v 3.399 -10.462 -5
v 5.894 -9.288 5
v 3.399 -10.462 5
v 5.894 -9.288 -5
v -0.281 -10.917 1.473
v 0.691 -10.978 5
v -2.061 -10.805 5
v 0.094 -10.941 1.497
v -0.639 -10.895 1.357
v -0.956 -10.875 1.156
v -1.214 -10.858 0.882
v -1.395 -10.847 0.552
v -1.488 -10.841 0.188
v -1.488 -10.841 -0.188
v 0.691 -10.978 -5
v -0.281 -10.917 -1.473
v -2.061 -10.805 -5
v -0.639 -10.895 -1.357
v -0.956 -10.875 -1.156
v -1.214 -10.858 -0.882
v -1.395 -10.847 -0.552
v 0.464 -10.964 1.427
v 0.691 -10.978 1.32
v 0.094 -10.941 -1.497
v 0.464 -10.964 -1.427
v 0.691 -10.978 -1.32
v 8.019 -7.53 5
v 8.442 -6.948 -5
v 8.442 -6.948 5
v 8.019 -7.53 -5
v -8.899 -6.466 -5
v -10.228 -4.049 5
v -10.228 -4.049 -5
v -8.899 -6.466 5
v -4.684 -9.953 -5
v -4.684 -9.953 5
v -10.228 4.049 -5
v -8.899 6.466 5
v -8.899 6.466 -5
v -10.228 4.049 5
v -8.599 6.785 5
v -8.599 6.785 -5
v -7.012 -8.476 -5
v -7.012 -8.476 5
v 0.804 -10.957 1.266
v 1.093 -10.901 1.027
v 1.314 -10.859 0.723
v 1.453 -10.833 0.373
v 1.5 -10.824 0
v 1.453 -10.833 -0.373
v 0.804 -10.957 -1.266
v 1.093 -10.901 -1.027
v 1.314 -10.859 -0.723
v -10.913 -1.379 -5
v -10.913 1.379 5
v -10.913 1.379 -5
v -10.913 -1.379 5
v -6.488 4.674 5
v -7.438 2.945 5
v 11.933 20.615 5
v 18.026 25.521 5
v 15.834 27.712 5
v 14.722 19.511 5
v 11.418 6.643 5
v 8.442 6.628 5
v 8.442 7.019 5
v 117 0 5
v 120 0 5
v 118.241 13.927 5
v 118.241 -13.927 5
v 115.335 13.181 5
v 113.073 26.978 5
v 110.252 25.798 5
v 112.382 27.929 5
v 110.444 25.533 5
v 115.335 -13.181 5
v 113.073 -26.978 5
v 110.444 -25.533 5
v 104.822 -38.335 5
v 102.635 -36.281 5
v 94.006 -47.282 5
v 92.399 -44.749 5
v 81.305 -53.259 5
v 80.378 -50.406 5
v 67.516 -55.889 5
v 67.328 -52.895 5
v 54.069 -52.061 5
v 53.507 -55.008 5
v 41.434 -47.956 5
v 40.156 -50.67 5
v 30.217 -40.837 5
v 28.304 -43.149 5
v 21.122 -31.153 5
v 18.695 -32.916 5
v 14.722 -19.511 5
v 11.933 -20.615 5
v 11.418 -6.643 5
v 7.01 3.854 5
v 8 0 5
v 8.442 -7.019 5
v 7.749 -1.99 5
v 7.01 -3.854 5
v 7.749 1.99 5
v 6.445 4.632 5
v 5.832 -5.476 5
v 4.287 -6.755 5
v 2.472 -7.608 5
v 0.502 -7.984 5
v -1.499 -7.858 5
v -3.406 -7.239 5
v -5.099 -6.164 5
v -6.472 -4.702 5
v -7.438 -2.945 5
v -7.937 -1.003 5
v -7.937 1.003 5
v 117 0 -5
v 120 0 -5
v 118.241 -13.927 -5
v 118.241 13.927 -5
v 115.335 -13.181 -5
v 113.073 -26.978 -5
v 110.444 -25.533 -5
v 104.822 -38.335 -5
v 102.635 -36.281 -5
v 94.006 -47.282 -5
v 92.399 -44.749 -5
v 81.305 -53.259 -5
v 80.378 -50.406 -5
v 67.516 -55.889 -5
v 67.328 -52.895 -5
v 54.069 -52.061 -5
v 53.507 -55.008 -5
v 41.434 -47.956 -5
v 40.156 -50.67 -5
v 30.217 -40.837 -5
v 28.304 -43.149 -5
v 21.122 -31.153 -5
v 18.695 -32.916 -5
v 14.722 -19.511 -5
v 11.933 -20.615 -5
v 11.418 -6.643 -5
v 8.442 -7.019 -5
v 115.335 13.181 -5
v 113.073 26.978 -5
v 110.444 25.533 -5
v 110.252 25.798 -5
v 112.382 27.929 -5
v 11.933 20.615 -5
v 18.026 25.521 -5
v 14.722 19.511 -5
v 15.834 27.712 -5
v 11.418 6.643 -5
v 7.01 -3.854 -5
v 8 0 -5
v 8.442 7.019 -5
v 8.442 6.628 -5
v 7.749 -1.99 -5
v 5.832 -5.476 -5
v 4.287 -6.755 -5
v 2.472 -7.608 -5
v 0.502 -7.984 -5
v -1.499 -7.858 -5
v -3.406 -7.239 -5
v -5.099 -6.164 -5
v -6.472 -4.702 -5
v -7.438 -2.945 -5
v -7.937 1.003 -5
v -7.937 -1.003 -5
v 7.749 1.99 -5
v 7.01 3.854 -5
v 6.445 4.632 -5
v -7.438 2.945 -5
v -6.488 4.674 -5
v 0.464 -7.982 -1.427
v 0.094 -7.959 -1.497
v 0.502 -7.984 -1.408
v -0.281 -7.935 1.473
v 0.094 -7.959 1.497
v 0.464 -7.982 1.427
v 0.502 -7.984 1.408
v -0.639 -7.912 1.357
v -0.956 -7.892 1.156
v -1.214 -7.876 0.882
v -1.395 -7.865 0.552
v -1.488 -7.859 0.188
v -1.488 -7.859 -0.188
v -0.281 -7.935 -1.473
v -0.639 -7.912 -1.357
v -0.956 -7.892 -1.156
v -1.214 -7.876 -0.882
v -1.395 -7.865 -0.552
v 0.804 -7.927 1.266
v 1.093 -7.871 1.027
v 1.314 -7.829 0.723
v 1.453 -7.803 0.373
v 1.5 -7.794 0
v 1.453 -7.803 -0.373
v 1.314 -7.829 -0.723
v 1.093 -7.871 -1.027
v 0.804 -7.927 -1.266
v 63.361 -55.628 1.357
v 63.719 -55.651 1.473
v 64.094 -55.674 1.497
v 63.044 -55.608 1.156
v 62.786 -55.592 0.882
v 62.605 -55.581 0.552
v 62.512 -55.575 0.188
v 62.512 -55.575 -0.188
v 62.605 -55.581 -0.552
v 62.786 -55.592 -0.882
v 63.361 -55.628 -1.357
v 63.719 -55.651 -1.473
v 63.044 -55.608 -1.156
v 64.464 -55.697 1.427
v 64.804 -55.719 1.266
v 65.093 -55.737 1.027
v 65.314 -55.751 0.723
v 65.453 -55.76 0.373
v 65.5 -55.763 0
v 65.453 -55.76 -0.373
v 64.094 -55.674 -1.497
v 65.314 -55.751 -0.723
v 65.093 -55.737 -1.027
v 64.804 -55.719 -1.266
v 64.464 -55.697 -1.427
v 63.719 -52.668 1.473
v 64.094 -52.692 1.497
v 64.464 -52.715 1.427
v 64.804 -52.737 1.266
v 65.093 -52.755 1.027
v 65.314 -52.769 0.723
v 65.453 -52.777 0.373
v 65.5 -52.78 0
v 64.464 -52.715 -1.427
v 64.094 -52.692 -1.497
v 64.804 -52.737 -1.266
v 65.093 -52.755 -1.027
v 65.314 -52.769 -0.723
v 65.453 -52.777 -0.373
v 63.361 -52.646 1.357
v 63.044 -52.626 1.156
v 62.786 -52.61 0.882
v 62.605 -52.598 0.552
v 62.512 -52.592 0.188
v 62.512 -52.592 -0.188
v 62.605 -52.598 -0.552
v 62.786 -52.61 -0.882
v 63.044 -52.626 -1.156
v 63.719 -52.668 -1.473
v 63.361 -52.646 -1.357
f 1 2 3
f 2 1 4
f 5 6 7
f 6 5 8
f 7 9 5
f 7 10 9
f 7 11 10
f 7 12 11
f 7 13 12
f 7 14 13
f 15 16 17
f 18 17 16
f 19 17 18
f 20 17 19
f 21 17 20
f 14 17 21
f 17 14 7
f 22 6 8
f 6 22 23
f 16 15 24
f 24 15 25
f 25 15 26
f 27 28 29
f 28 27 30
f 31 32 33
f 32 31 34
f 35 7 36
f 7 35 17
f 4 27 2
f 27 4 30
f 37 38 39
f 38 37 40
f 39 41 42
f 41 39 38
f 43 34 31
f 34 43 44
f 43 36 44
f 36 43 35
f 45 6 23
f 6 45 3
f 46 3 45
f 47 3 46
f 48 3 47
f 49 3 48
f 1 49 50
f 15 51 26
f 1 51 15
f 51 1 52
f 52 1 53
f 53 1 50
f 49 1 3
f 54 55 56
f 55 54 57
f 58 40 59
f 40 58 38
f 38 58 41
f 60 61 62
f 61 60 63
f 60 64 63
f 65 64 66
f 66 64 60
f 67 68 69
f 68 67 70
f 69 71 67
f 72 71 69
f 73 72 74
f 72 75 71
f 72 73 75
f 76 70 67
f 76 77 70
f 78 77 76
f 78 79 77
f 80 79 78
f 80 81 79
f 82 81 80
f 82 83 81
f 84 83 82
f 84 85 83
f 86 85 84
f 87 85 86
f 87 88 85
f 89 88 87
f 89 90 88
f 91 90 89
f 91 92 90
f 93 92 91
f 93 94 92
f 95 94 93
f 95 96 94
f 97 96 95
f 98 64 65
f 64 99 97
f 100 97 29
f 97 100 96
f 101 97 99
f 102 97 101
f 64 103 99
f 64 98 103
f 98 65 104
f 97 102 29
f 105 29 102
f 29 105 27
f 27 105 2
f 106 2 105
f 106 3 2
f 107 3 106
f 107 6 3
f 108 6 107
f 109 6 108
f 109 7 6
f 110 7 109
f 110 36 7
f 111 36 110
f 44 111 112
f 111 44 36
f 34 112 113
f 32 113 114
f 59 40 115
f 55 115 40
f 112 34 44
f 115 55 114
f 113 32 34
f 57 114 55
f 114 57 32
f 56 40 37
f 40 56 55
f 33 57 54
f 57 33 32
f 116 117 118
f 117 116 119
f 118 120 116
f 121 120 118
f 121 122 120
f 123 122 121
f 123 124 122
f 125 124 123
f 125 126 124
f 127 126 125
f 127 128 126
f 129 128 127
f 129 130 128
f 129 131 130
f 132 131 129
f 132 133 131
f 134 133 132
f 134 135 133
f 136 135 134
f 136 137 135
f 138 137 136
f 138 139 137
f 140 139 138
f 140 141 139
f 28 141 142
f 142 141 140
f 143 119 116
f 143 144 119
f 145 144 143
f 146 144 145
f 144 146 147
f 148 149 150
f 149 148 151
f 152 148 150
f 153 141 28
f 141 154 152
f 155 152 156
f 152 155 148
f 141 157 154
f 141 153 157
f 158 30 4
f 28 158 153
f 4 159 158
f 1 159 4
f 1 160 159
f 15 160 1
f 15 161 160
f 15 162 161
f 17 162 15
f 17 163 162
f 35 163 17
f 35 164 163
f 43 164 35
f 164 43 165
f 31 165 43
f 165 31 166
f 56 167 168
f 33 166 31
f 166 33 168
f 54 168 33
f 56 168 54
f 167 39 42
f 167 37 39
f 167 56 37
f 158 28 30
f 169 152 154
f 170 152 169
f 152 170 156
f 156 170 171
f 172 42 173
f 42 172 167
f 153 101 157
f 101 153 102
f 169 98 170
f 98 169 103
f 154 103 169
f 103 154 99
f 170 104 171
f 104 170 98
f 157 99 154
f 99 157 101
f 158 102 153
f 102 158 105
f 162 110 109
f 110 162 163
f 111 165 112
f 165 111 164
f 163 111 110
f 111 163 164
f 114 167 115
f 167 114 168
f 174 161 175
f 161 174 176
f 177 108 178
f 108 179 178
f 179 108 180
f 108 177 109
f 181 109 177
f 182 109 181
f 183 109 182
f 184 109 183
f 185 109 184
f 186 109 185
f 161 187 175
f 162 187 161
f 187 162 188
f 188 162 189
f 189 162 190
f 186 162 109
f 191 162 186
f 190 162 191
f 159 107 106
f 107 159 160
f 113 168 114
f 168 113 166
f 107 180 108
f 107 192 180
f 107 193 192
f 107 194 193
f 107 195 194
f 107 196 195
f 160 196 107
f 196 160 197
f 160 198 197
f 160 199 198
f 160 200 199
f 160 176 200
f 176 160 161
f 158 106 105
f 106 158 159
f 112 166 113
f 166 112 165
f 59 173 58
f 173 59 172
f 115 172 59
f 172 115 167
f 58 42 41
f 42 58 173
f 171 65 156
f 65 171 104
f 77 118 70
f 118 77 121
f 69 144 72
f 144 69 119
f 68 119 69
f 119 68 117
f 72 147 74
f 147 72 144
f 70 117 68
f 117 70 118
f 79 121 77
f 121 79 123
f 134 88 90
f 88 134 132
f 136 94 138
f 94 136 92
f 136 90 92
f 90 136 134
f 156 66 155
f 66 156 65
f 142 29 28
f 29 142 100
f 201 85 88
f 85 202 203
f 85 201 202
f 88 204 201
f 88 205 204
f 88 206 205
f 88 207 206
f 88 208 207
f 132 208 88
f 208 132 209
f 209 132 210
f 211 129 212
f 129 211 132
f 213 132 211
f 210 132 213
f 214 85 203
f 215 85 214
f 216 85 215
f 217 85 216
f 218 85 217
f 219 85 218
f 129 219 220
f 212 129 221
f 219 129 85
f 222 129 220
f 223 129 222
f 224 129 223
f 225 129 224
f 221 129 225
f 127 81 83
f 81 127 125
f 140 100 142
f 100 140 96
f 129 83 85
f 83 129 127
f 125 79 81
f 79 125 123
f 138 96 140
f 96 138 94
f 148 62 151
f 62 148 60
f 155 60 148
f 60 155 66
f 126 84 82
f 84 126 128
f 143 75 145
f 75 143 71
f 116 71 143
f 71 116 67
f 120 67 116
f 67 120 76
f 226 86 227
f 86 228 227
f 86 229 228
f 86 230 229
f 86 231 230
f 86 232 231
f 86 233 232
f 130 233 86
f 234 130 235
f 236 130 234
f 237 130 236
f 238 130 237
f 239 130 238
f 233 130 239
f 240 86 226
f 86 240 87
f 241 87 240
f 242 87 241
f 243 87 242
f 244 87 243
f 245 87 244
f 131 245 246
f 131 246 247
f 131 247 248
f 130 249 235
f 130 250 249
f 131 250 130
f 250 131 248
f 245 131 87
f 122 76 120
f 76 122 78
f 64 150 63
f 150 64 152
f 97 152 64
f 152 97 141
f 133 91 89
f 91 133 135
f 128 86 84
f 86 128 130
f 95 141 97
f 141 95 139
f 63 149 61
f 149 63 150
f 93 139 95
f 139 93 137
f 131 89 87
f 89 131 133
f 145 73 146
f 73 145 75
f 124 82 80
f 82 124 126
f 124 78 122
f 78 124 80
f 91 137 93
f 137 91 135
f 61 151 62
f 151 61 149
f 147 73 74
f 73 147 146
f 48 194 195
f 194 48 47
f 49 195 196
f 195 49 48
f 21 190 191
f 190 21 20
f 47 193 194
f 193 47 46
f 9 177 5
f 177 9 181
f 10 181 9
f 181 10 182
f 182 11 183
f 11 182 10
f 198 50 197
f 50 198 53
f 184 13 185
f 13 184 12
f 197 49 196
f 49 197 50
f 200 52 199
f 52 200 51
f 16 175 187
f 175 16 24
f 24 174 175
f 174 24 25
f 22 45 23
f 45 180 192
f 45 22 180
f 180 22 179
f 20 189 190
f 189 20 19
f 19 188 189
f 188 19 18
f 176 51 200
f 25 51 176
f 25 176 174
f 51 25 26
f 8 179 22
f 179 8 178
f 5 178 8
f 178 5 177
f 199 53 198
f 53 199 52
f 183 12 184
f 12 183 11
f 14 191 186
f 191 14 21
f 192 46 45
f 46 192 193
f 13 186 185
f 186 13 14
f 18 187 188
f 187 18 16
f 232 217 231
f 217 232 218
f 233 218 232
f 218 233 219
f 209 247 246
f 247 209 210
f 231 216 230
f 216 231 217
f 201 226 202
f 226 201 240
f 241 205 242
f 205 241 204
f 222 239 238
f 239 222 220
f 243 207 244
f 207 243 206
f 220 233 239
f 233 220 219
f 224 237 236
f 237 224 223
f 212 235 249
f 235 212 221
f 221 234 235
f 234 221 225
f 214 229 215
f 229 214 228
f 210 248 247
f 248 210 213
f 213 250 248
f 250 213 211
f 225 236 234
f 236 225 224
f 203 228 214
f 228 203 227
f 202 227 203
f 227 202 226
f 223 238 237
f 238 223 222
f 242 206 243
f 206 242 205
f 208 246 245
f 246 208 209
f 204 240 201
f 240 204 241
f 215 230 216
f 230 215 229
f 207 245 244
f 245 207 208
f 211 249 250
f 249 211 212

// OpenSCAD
//+------------------------------+
//|OPENSCAD double pipe clamp V2 |
//|      2016 gaziel@gmail.com   |
//|    beerware licence          |
//+------------------------------+  

//first pipe diametre
d1=16; 
//seconde pipe diametre
d2=106; 
//thinkness
ep=3; 
//hight
h=10; 
//if need support
pylone="no"; //[yes,no]
//need hole ?
hole="yes"; //[yes,no]
//hole diametre
dh=3;

$fn=50/2;

difference(){
    union(){
        //creaton des support de tuyaux
        clamp(min(d1,d2));
        translate([((d1+d2)/2)+ep,0,0])clamp(max(d1,d2));
        //creation du module d'accroce a plat
        if (pylone=="yes"){
            pylone(d1,d2);
            translate([(d1+d2)/4,-max(d1/2,d2/2)-ep/2,0])cube([((d1+d2)/2)+(2*ep),ep,h],center=true);
        }
    }       
    //creation des trous 
    if (hole=="yes"){
        rotate([90,0,0])cylinder(d=dh,h=max(d1,d2)*6,center=true);
        translate([((d1+d2)/2)+ep,0,0])rotate([90,0,0])cylinder(d=dh,h=max(d1,d2)*6,center=true);
    }
}

module pylone(dc1,dc2){
    hull(){    
        translate([0,-(min(dc1,dc2)/2)-(ep/2),0]) cube([h,ep,h], center=true);
        translate([0,-(max(dc1,dc2)/2)-ep/2,0]) cube([h+(2*ep),ep,h], center=true);
    }
}

module clamp(dc){
    difference(){
        cylinder(d=dc+ep*2,h=h,center=true);
        cylinder(d=dc,h=h,center=true);
        translate([0,(dc+ep)/2,0])rotate([0,0,45])cube([dc,dc,h],center=true);
    }
}
